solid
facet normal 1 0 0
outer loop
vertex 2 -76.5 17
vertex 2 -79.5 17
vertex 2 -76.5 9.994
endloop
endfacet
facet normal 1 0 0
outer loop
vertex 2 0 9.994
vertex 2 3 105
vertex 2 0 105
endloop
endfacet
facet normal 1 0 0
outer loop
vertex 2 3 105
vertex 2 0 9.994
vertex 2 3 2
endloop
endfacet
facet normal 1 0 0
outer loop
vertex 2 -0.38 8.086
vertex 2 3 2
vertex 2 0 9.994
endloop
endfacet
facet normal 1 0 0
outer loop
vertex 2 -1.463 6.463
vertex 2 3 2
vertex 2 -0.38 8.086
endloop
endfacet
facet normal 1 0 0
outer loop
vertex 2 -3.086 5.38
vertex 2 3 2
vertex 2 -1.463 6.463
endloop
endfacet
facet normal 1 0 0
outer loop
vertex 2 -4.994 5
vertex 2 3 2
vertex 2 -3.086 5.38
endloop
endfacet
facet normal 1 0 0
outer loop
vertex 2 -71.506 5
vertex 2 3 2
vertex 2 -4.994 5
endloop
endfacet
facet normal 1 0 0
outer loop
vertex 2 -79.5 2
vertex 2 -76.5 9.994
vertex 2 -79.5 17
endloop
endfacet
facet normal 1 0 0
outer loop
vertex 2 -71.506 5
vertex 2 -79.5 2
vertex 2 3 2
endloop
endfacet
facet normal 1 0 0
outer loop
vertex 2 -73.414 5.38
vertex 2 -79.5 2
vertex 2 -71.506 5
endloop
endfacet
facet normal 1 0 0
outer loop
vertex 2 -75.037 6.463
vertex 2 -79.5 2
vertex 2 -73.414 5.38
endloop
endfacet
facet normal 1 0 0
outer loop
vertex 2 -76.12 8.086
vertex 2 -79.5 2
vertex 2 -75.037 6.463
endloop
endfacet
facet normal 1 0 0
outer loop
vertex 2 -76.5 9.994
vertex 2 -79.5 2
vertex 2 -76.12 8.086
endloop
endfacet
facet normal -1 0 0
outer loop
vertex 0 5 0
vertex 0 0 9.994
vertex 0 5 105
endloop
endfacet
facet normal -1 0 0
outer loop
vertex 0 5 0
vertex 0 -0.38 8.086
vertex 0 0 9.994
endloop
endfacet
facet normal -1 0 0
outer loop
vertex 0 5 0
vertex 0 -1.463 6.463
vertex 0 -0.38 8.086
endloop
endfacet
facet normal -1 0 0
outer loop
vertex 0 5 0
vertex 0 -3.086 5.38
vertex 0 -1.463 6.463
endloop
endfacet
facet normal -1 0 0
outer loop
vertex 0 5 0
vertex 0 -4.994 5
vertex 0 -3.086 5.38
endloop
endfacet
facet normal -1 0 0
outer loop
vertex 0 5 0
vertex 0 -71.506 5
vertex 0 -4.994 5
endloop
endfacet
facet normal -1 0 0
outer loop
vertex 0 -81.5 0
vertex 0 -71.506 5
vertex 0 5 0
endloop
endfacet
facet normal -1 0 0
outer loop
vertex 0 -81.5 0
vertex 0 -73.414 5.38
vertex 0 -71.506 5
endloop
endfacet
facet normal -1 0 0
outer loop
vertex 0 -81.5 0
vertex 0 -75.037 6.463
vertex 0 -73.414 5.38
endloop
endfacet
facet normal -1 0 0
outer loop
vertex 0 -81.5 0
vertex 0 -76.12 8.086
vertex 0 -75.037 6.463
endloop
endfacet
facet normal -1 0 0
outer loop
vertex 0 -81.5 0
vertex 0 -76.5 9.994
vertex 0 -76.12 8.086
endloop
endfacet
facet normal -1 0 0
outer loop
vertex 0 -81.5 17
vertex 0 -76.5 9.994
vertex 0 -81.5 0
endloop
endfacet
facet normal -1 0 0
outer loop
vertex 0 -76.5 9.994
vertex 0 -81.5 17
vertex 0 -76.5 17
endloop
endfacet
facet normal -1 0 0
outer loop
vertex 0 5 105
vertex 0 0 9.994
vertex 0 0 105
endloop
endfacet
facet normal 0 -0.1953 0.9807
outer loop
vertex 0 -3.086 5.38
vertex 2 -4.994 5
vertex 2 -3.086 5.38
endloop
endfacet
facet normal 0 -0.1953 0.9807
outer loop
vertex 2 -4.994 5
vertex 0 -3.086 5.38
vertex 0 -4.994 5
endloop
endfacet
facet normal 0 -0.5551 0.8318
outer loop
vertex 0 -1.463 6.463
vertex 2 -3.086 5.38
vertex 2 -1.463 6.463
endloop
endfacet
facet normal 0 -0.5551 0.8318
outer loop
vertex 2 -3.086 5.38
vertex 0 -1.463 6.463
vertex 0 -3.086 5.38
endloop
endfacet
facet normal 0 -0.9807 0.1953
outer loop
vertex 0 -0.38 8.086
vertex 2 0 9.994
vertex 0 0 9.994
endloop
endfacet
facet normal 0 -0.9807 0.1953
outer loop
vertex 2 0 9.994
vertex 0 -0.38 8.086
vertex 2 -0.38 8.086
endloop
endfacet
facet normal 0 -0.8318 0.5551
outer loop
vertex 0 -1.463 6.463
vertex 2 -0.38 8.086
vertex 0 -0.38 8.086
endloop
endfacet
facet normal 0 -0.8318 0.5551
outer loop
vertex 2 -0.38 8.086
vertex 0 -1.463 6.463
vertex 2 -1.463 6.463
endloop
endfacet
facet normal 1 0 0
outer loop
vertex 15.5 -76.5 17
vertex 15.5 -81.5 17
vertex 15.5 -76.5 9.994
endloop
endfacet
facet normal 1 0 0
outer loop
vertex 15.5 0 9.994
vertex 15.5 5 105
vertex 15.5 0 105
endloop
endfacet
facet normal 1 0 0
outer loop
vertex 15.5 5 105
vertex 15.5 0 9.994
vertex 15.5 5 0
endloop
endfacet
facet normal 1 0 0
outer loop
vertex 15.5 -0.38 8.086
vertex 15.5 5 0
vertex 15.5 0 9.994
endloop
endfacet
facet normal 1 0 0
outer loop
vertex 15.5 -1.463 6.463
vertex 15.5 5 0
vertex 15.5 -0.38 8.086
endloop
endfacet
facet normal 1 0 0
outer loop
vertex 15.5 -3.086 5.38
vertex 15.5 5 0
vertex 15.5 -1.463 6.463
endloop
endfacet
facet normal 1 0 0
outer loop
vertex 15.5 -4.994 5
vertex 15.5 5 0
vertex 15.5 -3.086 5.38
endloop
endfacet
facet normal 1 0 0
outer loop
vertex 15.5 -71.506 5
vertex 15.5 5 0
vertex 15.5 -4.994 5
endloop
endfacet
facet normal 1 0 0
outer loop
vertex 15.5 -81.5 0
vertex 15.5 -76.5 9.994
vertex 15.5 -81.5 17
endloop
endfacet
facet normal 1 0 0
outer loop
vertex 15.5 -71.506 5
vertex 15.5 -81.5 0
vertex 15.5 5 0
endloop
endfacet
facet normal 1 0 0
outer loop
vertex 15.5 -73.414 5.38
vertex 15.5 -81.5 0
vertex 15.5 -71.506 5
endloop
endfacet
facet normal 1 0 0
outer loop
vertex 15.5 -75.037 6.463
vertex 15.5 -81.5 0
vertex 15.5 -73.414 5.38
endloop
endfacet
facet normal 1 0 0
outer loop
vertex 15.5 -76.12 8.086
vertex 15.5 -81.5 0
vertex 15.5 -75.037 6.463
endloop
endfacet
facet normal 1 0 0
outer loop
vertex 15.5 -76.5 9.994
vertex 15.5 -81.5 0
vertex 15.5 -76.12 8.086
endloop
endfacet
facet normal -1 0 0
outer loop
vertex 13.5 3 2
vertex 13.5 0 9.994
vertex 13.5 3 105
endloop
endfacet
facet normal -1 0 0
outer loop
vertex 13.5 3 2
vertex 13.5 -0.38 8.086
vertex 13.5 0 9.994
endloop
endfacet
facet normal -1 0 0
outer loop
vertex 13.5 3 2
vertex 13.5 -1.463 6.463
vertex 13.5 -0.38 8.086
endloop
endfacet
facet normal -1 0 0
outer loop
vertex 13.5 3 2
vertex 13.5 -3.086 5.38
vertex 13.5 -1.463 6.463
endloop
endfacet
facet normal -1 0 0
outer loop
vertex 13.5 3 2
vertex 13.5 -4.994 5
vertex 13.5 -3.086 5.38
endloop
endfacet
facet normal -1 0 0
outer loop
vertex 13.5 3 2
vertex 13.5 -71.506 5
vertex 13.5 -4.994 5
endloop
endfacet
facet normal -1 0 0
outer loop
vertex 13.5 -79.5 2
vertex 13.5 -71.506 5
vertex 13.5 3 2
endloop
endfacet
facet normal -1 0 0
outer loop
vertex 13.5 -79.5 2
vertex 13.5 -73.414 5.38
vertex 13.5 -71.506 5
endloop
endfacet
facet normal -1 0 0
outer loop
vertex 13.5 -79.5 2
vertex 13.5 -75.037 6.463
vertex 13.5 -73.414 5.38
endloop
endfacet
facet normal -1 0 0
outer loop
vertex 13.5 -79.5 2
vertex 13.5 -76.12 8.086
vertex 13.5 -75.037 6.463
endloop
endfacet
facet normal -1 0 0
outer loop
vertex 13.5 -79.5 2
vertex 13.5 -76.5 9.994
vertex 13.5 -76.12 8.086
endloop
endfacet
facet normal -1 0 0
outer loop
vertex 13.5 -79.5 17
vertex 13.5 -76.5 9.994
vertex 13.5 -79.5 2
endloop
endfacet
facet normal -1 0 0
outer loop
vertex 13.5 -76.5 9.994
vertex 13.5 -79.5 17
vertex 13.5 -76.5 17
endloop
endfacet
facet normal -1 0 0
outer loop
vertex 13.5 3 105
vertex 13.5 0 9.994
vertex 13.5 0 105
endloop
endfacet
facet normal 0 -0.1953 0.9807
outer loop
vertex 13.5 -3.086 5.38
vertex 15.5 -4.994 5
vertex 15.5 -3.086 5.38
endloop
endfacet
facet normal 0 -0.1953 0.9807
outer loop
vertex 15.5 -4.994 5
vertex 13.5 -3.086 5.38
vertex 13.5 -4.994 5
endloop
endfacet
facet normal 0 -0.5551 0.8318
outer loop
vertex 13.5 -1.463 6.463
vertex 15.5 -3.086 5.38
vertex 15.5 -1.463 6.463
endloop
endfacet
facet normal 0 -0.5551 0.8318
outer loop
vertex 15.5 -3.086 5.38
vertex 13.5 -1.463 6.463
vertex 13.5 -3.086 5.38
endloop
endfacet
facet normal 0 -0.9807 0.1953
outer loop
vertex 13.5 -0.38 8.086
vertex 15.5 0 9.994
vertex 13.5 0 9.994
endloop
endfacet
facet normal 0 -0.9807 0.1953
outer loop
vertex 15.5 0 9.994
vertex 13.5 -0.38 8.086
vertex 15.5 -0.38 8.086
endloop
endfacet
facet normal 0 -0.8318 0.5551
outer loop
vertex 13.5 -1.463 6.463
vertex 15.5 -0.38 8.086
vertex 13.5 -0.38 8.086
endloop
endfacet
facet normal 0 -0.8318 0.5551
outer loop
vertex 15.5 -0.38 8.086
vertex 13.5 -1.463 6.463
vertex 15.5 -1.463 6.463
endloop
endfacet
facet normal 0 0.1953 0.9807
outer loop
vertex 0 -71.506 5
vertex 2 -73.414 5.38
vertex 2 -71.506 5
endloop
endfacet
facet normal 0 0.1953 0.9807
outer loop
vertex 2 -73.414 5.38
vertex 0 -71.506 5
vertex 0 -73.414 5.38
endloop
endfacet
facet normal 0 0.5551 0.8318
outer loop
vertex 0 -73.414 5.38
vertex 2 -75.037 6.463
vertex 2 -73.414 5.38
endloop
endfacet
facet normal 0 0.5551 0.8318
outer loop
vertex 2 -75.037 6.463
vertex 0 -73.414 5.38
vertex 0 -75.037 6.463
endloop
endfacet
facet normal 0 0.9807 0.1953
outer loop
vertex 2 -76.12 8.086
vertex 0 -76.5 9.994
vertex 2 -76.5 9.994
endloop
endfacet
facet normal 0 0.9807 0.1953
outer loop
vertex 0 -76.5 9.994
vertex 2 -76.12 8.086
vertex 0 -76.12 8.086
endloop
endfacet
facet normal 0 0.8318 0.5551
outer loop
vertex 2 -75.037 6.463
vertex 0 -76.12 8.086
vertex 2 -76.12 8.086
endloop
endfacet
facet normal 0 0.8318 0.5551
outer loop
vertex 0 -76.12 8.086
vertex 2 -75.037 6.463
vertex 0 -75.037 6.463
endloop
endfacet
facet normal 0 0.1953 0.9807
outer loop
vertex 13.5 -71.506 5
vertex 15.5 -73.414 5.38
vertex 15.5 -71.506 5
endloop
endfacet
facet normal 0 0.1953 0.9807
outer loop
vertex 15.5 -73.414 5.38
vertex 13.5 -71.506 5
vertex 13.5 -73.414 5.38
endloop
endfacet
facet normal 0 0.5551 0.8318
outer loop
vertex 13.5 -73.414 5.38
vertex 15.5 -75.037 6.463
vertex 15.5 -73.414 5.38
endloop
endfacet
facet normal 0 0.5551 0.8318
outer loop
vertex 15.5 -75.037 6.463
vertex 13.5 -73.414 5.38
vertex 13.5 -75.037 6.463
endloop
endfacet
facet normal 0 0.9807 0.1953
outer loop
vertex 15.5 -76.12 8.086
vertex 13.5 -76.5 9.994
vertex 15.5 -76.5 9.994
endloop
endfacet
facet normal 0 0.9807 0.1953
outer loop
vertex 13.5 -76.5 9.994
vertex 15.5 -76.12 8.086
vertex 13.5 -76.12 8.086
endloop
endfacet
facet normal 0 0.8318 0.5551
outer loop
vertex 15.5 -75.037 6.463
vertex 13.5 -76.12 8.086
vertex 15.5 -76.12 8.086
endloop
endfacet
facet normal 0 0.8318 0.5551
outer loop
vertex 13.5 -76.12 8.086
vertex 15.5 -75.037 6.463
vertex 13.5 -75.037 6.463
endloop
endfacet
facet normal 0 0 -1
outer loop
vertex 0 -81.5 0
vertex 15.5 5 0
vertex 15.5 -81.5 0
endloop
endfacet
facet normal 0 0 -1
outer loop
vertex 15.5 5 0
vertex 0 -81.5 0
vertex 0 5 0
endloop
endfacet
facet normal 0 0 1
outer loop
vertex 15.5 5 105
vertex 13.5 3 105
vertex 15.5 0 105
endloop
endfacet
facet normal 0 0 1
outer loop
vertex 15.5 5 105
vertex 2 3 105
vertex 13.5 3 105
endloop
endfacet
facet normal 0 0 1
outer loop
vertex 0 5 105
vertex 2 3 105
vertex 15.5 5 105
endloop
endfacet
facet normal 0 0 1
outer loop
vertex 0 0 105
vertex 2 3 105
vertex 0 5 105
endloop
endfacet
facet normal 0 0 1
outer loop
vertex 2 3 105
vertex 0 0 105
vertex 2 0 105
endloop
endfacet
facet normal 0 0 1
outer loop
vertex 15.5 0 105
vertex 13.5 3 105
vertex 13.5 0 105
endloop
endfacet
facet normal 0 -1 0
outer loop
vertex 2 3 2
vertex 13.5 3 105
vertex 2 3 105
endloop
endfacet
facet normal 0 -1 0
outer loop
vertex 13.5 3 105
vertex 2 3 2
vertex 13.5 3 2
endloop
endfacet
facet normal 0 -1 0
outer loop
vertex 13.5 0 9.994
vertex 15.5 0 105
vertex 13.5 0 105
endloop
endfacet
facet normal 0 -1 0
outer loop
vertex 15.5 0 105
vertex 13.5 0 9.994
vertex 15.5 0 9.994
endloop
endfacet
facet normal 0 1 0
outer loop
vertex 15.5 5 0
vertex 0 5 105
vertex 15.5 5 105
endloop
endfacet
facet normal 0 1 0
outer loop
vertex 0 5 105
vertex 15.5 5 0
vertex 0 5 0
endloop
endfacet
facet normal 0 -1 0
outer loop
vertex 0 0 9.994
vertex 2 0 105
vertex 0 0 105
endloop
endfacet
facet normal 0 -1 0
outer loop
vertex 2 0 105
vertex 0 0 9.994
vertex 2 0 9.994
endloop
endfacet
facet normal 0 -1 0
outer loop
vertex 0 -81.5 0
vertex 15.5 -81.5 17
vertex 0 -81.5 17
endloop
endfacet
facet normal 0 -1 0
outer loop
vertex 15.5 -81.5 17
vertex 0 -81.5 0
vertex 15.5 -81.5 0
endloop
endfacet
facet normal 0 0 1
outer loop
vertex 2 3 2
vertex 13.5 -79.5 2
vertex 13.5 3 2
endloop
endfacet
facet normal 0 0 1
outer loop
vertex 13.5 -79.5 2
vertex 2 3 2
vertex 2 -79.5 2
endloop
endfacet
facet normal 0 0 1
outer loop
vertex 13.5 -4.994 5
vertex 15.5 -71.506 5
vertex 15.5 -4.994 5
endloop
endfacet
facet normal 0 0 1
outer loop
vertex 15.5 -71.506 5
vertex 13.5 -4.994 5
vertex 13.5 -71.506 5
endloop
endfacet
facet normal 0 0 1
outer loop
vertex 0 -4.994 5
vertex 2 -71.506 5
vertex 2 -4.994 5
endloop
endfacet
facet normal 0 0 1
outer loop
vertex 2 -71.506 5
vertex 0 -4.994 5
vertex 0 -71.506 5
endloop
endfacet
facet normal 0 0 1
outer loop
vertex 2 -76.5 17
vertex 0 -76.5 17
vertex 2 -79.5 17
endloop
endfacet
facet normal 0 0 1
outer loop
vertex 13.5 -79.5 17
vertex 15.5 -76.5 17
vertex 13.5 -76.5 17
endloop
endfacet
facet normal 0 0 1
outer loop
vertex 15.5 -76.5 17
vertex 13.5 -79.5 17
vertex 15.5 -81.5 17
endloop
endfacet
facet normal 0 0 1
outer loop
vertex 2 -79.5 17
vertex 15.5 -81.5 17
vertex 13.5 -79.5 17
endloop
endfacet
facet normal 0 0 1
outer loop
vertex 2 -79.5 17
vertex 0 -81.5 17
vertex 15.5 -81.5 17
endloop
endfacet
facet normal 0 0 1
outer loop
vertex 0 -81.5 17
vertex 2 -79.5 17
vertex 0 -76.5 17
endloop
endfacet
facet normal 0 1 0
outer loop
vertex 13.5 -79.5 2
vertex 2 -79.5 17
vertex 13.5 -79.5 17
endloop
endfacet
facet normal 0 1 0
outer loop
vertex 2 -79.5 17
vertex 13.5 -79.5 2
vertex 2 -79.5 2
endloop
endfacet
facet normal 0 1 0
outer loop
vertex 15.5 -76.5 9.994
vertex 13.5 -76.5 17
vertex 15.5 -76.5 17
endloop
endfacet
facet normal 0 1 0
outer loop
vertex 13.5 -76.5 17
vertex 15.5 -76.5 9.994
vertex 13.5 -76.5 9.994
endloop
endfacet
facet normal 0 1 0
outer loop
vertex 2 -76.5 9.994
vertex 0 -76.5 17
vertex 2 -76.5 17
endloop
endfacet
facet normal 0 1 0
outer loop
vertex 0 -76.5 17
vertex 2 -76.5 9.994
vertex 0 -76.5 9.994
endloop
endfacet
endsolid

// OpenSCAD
module cradle_leg(length=50) {
    linear_extrude(length)
        polygon([[0,0],[0,5],[15.5,5],[15.5,0],[13.5,0],[13.5,3],[2,3],[2,0]]);
}

module edge_curve(){
    difference() {
        cube([2,5,5]);
        translate([-0.5,0,5])
        rotate([0,90,0])
        cylinder(h=3,r=5);
    }
}

module cradle(base_length=105, overhang=17, phone_width=81.5){
    // long leg, bottom
    cradle_leg(base_length);

    // crossbeam, head
    translate([0,-phone_width,5])
    rotate([-90,0,0])
    cradle_leg(phone_width+4);

    // short leg, top
    translate([0,-phone_width+5,overhang])
    rotate([180,0,0])
    cradle_leg(overhang);
    
    // curve the inside corners
    translate([0,-4.999,5-0.001])
    edge_curve();
    translate([13.5,-4.999,5-0.001])
    edge_curve();
    translate([2,-phone_width+5+4.999,5-0.001])
    rotate([0,0,180])
    edge_curve();
    translate([15.5,-phone_width+5+4.999,5-0.001])
    rotate([0,0,180])
    edge_curve();
}

cradle();
